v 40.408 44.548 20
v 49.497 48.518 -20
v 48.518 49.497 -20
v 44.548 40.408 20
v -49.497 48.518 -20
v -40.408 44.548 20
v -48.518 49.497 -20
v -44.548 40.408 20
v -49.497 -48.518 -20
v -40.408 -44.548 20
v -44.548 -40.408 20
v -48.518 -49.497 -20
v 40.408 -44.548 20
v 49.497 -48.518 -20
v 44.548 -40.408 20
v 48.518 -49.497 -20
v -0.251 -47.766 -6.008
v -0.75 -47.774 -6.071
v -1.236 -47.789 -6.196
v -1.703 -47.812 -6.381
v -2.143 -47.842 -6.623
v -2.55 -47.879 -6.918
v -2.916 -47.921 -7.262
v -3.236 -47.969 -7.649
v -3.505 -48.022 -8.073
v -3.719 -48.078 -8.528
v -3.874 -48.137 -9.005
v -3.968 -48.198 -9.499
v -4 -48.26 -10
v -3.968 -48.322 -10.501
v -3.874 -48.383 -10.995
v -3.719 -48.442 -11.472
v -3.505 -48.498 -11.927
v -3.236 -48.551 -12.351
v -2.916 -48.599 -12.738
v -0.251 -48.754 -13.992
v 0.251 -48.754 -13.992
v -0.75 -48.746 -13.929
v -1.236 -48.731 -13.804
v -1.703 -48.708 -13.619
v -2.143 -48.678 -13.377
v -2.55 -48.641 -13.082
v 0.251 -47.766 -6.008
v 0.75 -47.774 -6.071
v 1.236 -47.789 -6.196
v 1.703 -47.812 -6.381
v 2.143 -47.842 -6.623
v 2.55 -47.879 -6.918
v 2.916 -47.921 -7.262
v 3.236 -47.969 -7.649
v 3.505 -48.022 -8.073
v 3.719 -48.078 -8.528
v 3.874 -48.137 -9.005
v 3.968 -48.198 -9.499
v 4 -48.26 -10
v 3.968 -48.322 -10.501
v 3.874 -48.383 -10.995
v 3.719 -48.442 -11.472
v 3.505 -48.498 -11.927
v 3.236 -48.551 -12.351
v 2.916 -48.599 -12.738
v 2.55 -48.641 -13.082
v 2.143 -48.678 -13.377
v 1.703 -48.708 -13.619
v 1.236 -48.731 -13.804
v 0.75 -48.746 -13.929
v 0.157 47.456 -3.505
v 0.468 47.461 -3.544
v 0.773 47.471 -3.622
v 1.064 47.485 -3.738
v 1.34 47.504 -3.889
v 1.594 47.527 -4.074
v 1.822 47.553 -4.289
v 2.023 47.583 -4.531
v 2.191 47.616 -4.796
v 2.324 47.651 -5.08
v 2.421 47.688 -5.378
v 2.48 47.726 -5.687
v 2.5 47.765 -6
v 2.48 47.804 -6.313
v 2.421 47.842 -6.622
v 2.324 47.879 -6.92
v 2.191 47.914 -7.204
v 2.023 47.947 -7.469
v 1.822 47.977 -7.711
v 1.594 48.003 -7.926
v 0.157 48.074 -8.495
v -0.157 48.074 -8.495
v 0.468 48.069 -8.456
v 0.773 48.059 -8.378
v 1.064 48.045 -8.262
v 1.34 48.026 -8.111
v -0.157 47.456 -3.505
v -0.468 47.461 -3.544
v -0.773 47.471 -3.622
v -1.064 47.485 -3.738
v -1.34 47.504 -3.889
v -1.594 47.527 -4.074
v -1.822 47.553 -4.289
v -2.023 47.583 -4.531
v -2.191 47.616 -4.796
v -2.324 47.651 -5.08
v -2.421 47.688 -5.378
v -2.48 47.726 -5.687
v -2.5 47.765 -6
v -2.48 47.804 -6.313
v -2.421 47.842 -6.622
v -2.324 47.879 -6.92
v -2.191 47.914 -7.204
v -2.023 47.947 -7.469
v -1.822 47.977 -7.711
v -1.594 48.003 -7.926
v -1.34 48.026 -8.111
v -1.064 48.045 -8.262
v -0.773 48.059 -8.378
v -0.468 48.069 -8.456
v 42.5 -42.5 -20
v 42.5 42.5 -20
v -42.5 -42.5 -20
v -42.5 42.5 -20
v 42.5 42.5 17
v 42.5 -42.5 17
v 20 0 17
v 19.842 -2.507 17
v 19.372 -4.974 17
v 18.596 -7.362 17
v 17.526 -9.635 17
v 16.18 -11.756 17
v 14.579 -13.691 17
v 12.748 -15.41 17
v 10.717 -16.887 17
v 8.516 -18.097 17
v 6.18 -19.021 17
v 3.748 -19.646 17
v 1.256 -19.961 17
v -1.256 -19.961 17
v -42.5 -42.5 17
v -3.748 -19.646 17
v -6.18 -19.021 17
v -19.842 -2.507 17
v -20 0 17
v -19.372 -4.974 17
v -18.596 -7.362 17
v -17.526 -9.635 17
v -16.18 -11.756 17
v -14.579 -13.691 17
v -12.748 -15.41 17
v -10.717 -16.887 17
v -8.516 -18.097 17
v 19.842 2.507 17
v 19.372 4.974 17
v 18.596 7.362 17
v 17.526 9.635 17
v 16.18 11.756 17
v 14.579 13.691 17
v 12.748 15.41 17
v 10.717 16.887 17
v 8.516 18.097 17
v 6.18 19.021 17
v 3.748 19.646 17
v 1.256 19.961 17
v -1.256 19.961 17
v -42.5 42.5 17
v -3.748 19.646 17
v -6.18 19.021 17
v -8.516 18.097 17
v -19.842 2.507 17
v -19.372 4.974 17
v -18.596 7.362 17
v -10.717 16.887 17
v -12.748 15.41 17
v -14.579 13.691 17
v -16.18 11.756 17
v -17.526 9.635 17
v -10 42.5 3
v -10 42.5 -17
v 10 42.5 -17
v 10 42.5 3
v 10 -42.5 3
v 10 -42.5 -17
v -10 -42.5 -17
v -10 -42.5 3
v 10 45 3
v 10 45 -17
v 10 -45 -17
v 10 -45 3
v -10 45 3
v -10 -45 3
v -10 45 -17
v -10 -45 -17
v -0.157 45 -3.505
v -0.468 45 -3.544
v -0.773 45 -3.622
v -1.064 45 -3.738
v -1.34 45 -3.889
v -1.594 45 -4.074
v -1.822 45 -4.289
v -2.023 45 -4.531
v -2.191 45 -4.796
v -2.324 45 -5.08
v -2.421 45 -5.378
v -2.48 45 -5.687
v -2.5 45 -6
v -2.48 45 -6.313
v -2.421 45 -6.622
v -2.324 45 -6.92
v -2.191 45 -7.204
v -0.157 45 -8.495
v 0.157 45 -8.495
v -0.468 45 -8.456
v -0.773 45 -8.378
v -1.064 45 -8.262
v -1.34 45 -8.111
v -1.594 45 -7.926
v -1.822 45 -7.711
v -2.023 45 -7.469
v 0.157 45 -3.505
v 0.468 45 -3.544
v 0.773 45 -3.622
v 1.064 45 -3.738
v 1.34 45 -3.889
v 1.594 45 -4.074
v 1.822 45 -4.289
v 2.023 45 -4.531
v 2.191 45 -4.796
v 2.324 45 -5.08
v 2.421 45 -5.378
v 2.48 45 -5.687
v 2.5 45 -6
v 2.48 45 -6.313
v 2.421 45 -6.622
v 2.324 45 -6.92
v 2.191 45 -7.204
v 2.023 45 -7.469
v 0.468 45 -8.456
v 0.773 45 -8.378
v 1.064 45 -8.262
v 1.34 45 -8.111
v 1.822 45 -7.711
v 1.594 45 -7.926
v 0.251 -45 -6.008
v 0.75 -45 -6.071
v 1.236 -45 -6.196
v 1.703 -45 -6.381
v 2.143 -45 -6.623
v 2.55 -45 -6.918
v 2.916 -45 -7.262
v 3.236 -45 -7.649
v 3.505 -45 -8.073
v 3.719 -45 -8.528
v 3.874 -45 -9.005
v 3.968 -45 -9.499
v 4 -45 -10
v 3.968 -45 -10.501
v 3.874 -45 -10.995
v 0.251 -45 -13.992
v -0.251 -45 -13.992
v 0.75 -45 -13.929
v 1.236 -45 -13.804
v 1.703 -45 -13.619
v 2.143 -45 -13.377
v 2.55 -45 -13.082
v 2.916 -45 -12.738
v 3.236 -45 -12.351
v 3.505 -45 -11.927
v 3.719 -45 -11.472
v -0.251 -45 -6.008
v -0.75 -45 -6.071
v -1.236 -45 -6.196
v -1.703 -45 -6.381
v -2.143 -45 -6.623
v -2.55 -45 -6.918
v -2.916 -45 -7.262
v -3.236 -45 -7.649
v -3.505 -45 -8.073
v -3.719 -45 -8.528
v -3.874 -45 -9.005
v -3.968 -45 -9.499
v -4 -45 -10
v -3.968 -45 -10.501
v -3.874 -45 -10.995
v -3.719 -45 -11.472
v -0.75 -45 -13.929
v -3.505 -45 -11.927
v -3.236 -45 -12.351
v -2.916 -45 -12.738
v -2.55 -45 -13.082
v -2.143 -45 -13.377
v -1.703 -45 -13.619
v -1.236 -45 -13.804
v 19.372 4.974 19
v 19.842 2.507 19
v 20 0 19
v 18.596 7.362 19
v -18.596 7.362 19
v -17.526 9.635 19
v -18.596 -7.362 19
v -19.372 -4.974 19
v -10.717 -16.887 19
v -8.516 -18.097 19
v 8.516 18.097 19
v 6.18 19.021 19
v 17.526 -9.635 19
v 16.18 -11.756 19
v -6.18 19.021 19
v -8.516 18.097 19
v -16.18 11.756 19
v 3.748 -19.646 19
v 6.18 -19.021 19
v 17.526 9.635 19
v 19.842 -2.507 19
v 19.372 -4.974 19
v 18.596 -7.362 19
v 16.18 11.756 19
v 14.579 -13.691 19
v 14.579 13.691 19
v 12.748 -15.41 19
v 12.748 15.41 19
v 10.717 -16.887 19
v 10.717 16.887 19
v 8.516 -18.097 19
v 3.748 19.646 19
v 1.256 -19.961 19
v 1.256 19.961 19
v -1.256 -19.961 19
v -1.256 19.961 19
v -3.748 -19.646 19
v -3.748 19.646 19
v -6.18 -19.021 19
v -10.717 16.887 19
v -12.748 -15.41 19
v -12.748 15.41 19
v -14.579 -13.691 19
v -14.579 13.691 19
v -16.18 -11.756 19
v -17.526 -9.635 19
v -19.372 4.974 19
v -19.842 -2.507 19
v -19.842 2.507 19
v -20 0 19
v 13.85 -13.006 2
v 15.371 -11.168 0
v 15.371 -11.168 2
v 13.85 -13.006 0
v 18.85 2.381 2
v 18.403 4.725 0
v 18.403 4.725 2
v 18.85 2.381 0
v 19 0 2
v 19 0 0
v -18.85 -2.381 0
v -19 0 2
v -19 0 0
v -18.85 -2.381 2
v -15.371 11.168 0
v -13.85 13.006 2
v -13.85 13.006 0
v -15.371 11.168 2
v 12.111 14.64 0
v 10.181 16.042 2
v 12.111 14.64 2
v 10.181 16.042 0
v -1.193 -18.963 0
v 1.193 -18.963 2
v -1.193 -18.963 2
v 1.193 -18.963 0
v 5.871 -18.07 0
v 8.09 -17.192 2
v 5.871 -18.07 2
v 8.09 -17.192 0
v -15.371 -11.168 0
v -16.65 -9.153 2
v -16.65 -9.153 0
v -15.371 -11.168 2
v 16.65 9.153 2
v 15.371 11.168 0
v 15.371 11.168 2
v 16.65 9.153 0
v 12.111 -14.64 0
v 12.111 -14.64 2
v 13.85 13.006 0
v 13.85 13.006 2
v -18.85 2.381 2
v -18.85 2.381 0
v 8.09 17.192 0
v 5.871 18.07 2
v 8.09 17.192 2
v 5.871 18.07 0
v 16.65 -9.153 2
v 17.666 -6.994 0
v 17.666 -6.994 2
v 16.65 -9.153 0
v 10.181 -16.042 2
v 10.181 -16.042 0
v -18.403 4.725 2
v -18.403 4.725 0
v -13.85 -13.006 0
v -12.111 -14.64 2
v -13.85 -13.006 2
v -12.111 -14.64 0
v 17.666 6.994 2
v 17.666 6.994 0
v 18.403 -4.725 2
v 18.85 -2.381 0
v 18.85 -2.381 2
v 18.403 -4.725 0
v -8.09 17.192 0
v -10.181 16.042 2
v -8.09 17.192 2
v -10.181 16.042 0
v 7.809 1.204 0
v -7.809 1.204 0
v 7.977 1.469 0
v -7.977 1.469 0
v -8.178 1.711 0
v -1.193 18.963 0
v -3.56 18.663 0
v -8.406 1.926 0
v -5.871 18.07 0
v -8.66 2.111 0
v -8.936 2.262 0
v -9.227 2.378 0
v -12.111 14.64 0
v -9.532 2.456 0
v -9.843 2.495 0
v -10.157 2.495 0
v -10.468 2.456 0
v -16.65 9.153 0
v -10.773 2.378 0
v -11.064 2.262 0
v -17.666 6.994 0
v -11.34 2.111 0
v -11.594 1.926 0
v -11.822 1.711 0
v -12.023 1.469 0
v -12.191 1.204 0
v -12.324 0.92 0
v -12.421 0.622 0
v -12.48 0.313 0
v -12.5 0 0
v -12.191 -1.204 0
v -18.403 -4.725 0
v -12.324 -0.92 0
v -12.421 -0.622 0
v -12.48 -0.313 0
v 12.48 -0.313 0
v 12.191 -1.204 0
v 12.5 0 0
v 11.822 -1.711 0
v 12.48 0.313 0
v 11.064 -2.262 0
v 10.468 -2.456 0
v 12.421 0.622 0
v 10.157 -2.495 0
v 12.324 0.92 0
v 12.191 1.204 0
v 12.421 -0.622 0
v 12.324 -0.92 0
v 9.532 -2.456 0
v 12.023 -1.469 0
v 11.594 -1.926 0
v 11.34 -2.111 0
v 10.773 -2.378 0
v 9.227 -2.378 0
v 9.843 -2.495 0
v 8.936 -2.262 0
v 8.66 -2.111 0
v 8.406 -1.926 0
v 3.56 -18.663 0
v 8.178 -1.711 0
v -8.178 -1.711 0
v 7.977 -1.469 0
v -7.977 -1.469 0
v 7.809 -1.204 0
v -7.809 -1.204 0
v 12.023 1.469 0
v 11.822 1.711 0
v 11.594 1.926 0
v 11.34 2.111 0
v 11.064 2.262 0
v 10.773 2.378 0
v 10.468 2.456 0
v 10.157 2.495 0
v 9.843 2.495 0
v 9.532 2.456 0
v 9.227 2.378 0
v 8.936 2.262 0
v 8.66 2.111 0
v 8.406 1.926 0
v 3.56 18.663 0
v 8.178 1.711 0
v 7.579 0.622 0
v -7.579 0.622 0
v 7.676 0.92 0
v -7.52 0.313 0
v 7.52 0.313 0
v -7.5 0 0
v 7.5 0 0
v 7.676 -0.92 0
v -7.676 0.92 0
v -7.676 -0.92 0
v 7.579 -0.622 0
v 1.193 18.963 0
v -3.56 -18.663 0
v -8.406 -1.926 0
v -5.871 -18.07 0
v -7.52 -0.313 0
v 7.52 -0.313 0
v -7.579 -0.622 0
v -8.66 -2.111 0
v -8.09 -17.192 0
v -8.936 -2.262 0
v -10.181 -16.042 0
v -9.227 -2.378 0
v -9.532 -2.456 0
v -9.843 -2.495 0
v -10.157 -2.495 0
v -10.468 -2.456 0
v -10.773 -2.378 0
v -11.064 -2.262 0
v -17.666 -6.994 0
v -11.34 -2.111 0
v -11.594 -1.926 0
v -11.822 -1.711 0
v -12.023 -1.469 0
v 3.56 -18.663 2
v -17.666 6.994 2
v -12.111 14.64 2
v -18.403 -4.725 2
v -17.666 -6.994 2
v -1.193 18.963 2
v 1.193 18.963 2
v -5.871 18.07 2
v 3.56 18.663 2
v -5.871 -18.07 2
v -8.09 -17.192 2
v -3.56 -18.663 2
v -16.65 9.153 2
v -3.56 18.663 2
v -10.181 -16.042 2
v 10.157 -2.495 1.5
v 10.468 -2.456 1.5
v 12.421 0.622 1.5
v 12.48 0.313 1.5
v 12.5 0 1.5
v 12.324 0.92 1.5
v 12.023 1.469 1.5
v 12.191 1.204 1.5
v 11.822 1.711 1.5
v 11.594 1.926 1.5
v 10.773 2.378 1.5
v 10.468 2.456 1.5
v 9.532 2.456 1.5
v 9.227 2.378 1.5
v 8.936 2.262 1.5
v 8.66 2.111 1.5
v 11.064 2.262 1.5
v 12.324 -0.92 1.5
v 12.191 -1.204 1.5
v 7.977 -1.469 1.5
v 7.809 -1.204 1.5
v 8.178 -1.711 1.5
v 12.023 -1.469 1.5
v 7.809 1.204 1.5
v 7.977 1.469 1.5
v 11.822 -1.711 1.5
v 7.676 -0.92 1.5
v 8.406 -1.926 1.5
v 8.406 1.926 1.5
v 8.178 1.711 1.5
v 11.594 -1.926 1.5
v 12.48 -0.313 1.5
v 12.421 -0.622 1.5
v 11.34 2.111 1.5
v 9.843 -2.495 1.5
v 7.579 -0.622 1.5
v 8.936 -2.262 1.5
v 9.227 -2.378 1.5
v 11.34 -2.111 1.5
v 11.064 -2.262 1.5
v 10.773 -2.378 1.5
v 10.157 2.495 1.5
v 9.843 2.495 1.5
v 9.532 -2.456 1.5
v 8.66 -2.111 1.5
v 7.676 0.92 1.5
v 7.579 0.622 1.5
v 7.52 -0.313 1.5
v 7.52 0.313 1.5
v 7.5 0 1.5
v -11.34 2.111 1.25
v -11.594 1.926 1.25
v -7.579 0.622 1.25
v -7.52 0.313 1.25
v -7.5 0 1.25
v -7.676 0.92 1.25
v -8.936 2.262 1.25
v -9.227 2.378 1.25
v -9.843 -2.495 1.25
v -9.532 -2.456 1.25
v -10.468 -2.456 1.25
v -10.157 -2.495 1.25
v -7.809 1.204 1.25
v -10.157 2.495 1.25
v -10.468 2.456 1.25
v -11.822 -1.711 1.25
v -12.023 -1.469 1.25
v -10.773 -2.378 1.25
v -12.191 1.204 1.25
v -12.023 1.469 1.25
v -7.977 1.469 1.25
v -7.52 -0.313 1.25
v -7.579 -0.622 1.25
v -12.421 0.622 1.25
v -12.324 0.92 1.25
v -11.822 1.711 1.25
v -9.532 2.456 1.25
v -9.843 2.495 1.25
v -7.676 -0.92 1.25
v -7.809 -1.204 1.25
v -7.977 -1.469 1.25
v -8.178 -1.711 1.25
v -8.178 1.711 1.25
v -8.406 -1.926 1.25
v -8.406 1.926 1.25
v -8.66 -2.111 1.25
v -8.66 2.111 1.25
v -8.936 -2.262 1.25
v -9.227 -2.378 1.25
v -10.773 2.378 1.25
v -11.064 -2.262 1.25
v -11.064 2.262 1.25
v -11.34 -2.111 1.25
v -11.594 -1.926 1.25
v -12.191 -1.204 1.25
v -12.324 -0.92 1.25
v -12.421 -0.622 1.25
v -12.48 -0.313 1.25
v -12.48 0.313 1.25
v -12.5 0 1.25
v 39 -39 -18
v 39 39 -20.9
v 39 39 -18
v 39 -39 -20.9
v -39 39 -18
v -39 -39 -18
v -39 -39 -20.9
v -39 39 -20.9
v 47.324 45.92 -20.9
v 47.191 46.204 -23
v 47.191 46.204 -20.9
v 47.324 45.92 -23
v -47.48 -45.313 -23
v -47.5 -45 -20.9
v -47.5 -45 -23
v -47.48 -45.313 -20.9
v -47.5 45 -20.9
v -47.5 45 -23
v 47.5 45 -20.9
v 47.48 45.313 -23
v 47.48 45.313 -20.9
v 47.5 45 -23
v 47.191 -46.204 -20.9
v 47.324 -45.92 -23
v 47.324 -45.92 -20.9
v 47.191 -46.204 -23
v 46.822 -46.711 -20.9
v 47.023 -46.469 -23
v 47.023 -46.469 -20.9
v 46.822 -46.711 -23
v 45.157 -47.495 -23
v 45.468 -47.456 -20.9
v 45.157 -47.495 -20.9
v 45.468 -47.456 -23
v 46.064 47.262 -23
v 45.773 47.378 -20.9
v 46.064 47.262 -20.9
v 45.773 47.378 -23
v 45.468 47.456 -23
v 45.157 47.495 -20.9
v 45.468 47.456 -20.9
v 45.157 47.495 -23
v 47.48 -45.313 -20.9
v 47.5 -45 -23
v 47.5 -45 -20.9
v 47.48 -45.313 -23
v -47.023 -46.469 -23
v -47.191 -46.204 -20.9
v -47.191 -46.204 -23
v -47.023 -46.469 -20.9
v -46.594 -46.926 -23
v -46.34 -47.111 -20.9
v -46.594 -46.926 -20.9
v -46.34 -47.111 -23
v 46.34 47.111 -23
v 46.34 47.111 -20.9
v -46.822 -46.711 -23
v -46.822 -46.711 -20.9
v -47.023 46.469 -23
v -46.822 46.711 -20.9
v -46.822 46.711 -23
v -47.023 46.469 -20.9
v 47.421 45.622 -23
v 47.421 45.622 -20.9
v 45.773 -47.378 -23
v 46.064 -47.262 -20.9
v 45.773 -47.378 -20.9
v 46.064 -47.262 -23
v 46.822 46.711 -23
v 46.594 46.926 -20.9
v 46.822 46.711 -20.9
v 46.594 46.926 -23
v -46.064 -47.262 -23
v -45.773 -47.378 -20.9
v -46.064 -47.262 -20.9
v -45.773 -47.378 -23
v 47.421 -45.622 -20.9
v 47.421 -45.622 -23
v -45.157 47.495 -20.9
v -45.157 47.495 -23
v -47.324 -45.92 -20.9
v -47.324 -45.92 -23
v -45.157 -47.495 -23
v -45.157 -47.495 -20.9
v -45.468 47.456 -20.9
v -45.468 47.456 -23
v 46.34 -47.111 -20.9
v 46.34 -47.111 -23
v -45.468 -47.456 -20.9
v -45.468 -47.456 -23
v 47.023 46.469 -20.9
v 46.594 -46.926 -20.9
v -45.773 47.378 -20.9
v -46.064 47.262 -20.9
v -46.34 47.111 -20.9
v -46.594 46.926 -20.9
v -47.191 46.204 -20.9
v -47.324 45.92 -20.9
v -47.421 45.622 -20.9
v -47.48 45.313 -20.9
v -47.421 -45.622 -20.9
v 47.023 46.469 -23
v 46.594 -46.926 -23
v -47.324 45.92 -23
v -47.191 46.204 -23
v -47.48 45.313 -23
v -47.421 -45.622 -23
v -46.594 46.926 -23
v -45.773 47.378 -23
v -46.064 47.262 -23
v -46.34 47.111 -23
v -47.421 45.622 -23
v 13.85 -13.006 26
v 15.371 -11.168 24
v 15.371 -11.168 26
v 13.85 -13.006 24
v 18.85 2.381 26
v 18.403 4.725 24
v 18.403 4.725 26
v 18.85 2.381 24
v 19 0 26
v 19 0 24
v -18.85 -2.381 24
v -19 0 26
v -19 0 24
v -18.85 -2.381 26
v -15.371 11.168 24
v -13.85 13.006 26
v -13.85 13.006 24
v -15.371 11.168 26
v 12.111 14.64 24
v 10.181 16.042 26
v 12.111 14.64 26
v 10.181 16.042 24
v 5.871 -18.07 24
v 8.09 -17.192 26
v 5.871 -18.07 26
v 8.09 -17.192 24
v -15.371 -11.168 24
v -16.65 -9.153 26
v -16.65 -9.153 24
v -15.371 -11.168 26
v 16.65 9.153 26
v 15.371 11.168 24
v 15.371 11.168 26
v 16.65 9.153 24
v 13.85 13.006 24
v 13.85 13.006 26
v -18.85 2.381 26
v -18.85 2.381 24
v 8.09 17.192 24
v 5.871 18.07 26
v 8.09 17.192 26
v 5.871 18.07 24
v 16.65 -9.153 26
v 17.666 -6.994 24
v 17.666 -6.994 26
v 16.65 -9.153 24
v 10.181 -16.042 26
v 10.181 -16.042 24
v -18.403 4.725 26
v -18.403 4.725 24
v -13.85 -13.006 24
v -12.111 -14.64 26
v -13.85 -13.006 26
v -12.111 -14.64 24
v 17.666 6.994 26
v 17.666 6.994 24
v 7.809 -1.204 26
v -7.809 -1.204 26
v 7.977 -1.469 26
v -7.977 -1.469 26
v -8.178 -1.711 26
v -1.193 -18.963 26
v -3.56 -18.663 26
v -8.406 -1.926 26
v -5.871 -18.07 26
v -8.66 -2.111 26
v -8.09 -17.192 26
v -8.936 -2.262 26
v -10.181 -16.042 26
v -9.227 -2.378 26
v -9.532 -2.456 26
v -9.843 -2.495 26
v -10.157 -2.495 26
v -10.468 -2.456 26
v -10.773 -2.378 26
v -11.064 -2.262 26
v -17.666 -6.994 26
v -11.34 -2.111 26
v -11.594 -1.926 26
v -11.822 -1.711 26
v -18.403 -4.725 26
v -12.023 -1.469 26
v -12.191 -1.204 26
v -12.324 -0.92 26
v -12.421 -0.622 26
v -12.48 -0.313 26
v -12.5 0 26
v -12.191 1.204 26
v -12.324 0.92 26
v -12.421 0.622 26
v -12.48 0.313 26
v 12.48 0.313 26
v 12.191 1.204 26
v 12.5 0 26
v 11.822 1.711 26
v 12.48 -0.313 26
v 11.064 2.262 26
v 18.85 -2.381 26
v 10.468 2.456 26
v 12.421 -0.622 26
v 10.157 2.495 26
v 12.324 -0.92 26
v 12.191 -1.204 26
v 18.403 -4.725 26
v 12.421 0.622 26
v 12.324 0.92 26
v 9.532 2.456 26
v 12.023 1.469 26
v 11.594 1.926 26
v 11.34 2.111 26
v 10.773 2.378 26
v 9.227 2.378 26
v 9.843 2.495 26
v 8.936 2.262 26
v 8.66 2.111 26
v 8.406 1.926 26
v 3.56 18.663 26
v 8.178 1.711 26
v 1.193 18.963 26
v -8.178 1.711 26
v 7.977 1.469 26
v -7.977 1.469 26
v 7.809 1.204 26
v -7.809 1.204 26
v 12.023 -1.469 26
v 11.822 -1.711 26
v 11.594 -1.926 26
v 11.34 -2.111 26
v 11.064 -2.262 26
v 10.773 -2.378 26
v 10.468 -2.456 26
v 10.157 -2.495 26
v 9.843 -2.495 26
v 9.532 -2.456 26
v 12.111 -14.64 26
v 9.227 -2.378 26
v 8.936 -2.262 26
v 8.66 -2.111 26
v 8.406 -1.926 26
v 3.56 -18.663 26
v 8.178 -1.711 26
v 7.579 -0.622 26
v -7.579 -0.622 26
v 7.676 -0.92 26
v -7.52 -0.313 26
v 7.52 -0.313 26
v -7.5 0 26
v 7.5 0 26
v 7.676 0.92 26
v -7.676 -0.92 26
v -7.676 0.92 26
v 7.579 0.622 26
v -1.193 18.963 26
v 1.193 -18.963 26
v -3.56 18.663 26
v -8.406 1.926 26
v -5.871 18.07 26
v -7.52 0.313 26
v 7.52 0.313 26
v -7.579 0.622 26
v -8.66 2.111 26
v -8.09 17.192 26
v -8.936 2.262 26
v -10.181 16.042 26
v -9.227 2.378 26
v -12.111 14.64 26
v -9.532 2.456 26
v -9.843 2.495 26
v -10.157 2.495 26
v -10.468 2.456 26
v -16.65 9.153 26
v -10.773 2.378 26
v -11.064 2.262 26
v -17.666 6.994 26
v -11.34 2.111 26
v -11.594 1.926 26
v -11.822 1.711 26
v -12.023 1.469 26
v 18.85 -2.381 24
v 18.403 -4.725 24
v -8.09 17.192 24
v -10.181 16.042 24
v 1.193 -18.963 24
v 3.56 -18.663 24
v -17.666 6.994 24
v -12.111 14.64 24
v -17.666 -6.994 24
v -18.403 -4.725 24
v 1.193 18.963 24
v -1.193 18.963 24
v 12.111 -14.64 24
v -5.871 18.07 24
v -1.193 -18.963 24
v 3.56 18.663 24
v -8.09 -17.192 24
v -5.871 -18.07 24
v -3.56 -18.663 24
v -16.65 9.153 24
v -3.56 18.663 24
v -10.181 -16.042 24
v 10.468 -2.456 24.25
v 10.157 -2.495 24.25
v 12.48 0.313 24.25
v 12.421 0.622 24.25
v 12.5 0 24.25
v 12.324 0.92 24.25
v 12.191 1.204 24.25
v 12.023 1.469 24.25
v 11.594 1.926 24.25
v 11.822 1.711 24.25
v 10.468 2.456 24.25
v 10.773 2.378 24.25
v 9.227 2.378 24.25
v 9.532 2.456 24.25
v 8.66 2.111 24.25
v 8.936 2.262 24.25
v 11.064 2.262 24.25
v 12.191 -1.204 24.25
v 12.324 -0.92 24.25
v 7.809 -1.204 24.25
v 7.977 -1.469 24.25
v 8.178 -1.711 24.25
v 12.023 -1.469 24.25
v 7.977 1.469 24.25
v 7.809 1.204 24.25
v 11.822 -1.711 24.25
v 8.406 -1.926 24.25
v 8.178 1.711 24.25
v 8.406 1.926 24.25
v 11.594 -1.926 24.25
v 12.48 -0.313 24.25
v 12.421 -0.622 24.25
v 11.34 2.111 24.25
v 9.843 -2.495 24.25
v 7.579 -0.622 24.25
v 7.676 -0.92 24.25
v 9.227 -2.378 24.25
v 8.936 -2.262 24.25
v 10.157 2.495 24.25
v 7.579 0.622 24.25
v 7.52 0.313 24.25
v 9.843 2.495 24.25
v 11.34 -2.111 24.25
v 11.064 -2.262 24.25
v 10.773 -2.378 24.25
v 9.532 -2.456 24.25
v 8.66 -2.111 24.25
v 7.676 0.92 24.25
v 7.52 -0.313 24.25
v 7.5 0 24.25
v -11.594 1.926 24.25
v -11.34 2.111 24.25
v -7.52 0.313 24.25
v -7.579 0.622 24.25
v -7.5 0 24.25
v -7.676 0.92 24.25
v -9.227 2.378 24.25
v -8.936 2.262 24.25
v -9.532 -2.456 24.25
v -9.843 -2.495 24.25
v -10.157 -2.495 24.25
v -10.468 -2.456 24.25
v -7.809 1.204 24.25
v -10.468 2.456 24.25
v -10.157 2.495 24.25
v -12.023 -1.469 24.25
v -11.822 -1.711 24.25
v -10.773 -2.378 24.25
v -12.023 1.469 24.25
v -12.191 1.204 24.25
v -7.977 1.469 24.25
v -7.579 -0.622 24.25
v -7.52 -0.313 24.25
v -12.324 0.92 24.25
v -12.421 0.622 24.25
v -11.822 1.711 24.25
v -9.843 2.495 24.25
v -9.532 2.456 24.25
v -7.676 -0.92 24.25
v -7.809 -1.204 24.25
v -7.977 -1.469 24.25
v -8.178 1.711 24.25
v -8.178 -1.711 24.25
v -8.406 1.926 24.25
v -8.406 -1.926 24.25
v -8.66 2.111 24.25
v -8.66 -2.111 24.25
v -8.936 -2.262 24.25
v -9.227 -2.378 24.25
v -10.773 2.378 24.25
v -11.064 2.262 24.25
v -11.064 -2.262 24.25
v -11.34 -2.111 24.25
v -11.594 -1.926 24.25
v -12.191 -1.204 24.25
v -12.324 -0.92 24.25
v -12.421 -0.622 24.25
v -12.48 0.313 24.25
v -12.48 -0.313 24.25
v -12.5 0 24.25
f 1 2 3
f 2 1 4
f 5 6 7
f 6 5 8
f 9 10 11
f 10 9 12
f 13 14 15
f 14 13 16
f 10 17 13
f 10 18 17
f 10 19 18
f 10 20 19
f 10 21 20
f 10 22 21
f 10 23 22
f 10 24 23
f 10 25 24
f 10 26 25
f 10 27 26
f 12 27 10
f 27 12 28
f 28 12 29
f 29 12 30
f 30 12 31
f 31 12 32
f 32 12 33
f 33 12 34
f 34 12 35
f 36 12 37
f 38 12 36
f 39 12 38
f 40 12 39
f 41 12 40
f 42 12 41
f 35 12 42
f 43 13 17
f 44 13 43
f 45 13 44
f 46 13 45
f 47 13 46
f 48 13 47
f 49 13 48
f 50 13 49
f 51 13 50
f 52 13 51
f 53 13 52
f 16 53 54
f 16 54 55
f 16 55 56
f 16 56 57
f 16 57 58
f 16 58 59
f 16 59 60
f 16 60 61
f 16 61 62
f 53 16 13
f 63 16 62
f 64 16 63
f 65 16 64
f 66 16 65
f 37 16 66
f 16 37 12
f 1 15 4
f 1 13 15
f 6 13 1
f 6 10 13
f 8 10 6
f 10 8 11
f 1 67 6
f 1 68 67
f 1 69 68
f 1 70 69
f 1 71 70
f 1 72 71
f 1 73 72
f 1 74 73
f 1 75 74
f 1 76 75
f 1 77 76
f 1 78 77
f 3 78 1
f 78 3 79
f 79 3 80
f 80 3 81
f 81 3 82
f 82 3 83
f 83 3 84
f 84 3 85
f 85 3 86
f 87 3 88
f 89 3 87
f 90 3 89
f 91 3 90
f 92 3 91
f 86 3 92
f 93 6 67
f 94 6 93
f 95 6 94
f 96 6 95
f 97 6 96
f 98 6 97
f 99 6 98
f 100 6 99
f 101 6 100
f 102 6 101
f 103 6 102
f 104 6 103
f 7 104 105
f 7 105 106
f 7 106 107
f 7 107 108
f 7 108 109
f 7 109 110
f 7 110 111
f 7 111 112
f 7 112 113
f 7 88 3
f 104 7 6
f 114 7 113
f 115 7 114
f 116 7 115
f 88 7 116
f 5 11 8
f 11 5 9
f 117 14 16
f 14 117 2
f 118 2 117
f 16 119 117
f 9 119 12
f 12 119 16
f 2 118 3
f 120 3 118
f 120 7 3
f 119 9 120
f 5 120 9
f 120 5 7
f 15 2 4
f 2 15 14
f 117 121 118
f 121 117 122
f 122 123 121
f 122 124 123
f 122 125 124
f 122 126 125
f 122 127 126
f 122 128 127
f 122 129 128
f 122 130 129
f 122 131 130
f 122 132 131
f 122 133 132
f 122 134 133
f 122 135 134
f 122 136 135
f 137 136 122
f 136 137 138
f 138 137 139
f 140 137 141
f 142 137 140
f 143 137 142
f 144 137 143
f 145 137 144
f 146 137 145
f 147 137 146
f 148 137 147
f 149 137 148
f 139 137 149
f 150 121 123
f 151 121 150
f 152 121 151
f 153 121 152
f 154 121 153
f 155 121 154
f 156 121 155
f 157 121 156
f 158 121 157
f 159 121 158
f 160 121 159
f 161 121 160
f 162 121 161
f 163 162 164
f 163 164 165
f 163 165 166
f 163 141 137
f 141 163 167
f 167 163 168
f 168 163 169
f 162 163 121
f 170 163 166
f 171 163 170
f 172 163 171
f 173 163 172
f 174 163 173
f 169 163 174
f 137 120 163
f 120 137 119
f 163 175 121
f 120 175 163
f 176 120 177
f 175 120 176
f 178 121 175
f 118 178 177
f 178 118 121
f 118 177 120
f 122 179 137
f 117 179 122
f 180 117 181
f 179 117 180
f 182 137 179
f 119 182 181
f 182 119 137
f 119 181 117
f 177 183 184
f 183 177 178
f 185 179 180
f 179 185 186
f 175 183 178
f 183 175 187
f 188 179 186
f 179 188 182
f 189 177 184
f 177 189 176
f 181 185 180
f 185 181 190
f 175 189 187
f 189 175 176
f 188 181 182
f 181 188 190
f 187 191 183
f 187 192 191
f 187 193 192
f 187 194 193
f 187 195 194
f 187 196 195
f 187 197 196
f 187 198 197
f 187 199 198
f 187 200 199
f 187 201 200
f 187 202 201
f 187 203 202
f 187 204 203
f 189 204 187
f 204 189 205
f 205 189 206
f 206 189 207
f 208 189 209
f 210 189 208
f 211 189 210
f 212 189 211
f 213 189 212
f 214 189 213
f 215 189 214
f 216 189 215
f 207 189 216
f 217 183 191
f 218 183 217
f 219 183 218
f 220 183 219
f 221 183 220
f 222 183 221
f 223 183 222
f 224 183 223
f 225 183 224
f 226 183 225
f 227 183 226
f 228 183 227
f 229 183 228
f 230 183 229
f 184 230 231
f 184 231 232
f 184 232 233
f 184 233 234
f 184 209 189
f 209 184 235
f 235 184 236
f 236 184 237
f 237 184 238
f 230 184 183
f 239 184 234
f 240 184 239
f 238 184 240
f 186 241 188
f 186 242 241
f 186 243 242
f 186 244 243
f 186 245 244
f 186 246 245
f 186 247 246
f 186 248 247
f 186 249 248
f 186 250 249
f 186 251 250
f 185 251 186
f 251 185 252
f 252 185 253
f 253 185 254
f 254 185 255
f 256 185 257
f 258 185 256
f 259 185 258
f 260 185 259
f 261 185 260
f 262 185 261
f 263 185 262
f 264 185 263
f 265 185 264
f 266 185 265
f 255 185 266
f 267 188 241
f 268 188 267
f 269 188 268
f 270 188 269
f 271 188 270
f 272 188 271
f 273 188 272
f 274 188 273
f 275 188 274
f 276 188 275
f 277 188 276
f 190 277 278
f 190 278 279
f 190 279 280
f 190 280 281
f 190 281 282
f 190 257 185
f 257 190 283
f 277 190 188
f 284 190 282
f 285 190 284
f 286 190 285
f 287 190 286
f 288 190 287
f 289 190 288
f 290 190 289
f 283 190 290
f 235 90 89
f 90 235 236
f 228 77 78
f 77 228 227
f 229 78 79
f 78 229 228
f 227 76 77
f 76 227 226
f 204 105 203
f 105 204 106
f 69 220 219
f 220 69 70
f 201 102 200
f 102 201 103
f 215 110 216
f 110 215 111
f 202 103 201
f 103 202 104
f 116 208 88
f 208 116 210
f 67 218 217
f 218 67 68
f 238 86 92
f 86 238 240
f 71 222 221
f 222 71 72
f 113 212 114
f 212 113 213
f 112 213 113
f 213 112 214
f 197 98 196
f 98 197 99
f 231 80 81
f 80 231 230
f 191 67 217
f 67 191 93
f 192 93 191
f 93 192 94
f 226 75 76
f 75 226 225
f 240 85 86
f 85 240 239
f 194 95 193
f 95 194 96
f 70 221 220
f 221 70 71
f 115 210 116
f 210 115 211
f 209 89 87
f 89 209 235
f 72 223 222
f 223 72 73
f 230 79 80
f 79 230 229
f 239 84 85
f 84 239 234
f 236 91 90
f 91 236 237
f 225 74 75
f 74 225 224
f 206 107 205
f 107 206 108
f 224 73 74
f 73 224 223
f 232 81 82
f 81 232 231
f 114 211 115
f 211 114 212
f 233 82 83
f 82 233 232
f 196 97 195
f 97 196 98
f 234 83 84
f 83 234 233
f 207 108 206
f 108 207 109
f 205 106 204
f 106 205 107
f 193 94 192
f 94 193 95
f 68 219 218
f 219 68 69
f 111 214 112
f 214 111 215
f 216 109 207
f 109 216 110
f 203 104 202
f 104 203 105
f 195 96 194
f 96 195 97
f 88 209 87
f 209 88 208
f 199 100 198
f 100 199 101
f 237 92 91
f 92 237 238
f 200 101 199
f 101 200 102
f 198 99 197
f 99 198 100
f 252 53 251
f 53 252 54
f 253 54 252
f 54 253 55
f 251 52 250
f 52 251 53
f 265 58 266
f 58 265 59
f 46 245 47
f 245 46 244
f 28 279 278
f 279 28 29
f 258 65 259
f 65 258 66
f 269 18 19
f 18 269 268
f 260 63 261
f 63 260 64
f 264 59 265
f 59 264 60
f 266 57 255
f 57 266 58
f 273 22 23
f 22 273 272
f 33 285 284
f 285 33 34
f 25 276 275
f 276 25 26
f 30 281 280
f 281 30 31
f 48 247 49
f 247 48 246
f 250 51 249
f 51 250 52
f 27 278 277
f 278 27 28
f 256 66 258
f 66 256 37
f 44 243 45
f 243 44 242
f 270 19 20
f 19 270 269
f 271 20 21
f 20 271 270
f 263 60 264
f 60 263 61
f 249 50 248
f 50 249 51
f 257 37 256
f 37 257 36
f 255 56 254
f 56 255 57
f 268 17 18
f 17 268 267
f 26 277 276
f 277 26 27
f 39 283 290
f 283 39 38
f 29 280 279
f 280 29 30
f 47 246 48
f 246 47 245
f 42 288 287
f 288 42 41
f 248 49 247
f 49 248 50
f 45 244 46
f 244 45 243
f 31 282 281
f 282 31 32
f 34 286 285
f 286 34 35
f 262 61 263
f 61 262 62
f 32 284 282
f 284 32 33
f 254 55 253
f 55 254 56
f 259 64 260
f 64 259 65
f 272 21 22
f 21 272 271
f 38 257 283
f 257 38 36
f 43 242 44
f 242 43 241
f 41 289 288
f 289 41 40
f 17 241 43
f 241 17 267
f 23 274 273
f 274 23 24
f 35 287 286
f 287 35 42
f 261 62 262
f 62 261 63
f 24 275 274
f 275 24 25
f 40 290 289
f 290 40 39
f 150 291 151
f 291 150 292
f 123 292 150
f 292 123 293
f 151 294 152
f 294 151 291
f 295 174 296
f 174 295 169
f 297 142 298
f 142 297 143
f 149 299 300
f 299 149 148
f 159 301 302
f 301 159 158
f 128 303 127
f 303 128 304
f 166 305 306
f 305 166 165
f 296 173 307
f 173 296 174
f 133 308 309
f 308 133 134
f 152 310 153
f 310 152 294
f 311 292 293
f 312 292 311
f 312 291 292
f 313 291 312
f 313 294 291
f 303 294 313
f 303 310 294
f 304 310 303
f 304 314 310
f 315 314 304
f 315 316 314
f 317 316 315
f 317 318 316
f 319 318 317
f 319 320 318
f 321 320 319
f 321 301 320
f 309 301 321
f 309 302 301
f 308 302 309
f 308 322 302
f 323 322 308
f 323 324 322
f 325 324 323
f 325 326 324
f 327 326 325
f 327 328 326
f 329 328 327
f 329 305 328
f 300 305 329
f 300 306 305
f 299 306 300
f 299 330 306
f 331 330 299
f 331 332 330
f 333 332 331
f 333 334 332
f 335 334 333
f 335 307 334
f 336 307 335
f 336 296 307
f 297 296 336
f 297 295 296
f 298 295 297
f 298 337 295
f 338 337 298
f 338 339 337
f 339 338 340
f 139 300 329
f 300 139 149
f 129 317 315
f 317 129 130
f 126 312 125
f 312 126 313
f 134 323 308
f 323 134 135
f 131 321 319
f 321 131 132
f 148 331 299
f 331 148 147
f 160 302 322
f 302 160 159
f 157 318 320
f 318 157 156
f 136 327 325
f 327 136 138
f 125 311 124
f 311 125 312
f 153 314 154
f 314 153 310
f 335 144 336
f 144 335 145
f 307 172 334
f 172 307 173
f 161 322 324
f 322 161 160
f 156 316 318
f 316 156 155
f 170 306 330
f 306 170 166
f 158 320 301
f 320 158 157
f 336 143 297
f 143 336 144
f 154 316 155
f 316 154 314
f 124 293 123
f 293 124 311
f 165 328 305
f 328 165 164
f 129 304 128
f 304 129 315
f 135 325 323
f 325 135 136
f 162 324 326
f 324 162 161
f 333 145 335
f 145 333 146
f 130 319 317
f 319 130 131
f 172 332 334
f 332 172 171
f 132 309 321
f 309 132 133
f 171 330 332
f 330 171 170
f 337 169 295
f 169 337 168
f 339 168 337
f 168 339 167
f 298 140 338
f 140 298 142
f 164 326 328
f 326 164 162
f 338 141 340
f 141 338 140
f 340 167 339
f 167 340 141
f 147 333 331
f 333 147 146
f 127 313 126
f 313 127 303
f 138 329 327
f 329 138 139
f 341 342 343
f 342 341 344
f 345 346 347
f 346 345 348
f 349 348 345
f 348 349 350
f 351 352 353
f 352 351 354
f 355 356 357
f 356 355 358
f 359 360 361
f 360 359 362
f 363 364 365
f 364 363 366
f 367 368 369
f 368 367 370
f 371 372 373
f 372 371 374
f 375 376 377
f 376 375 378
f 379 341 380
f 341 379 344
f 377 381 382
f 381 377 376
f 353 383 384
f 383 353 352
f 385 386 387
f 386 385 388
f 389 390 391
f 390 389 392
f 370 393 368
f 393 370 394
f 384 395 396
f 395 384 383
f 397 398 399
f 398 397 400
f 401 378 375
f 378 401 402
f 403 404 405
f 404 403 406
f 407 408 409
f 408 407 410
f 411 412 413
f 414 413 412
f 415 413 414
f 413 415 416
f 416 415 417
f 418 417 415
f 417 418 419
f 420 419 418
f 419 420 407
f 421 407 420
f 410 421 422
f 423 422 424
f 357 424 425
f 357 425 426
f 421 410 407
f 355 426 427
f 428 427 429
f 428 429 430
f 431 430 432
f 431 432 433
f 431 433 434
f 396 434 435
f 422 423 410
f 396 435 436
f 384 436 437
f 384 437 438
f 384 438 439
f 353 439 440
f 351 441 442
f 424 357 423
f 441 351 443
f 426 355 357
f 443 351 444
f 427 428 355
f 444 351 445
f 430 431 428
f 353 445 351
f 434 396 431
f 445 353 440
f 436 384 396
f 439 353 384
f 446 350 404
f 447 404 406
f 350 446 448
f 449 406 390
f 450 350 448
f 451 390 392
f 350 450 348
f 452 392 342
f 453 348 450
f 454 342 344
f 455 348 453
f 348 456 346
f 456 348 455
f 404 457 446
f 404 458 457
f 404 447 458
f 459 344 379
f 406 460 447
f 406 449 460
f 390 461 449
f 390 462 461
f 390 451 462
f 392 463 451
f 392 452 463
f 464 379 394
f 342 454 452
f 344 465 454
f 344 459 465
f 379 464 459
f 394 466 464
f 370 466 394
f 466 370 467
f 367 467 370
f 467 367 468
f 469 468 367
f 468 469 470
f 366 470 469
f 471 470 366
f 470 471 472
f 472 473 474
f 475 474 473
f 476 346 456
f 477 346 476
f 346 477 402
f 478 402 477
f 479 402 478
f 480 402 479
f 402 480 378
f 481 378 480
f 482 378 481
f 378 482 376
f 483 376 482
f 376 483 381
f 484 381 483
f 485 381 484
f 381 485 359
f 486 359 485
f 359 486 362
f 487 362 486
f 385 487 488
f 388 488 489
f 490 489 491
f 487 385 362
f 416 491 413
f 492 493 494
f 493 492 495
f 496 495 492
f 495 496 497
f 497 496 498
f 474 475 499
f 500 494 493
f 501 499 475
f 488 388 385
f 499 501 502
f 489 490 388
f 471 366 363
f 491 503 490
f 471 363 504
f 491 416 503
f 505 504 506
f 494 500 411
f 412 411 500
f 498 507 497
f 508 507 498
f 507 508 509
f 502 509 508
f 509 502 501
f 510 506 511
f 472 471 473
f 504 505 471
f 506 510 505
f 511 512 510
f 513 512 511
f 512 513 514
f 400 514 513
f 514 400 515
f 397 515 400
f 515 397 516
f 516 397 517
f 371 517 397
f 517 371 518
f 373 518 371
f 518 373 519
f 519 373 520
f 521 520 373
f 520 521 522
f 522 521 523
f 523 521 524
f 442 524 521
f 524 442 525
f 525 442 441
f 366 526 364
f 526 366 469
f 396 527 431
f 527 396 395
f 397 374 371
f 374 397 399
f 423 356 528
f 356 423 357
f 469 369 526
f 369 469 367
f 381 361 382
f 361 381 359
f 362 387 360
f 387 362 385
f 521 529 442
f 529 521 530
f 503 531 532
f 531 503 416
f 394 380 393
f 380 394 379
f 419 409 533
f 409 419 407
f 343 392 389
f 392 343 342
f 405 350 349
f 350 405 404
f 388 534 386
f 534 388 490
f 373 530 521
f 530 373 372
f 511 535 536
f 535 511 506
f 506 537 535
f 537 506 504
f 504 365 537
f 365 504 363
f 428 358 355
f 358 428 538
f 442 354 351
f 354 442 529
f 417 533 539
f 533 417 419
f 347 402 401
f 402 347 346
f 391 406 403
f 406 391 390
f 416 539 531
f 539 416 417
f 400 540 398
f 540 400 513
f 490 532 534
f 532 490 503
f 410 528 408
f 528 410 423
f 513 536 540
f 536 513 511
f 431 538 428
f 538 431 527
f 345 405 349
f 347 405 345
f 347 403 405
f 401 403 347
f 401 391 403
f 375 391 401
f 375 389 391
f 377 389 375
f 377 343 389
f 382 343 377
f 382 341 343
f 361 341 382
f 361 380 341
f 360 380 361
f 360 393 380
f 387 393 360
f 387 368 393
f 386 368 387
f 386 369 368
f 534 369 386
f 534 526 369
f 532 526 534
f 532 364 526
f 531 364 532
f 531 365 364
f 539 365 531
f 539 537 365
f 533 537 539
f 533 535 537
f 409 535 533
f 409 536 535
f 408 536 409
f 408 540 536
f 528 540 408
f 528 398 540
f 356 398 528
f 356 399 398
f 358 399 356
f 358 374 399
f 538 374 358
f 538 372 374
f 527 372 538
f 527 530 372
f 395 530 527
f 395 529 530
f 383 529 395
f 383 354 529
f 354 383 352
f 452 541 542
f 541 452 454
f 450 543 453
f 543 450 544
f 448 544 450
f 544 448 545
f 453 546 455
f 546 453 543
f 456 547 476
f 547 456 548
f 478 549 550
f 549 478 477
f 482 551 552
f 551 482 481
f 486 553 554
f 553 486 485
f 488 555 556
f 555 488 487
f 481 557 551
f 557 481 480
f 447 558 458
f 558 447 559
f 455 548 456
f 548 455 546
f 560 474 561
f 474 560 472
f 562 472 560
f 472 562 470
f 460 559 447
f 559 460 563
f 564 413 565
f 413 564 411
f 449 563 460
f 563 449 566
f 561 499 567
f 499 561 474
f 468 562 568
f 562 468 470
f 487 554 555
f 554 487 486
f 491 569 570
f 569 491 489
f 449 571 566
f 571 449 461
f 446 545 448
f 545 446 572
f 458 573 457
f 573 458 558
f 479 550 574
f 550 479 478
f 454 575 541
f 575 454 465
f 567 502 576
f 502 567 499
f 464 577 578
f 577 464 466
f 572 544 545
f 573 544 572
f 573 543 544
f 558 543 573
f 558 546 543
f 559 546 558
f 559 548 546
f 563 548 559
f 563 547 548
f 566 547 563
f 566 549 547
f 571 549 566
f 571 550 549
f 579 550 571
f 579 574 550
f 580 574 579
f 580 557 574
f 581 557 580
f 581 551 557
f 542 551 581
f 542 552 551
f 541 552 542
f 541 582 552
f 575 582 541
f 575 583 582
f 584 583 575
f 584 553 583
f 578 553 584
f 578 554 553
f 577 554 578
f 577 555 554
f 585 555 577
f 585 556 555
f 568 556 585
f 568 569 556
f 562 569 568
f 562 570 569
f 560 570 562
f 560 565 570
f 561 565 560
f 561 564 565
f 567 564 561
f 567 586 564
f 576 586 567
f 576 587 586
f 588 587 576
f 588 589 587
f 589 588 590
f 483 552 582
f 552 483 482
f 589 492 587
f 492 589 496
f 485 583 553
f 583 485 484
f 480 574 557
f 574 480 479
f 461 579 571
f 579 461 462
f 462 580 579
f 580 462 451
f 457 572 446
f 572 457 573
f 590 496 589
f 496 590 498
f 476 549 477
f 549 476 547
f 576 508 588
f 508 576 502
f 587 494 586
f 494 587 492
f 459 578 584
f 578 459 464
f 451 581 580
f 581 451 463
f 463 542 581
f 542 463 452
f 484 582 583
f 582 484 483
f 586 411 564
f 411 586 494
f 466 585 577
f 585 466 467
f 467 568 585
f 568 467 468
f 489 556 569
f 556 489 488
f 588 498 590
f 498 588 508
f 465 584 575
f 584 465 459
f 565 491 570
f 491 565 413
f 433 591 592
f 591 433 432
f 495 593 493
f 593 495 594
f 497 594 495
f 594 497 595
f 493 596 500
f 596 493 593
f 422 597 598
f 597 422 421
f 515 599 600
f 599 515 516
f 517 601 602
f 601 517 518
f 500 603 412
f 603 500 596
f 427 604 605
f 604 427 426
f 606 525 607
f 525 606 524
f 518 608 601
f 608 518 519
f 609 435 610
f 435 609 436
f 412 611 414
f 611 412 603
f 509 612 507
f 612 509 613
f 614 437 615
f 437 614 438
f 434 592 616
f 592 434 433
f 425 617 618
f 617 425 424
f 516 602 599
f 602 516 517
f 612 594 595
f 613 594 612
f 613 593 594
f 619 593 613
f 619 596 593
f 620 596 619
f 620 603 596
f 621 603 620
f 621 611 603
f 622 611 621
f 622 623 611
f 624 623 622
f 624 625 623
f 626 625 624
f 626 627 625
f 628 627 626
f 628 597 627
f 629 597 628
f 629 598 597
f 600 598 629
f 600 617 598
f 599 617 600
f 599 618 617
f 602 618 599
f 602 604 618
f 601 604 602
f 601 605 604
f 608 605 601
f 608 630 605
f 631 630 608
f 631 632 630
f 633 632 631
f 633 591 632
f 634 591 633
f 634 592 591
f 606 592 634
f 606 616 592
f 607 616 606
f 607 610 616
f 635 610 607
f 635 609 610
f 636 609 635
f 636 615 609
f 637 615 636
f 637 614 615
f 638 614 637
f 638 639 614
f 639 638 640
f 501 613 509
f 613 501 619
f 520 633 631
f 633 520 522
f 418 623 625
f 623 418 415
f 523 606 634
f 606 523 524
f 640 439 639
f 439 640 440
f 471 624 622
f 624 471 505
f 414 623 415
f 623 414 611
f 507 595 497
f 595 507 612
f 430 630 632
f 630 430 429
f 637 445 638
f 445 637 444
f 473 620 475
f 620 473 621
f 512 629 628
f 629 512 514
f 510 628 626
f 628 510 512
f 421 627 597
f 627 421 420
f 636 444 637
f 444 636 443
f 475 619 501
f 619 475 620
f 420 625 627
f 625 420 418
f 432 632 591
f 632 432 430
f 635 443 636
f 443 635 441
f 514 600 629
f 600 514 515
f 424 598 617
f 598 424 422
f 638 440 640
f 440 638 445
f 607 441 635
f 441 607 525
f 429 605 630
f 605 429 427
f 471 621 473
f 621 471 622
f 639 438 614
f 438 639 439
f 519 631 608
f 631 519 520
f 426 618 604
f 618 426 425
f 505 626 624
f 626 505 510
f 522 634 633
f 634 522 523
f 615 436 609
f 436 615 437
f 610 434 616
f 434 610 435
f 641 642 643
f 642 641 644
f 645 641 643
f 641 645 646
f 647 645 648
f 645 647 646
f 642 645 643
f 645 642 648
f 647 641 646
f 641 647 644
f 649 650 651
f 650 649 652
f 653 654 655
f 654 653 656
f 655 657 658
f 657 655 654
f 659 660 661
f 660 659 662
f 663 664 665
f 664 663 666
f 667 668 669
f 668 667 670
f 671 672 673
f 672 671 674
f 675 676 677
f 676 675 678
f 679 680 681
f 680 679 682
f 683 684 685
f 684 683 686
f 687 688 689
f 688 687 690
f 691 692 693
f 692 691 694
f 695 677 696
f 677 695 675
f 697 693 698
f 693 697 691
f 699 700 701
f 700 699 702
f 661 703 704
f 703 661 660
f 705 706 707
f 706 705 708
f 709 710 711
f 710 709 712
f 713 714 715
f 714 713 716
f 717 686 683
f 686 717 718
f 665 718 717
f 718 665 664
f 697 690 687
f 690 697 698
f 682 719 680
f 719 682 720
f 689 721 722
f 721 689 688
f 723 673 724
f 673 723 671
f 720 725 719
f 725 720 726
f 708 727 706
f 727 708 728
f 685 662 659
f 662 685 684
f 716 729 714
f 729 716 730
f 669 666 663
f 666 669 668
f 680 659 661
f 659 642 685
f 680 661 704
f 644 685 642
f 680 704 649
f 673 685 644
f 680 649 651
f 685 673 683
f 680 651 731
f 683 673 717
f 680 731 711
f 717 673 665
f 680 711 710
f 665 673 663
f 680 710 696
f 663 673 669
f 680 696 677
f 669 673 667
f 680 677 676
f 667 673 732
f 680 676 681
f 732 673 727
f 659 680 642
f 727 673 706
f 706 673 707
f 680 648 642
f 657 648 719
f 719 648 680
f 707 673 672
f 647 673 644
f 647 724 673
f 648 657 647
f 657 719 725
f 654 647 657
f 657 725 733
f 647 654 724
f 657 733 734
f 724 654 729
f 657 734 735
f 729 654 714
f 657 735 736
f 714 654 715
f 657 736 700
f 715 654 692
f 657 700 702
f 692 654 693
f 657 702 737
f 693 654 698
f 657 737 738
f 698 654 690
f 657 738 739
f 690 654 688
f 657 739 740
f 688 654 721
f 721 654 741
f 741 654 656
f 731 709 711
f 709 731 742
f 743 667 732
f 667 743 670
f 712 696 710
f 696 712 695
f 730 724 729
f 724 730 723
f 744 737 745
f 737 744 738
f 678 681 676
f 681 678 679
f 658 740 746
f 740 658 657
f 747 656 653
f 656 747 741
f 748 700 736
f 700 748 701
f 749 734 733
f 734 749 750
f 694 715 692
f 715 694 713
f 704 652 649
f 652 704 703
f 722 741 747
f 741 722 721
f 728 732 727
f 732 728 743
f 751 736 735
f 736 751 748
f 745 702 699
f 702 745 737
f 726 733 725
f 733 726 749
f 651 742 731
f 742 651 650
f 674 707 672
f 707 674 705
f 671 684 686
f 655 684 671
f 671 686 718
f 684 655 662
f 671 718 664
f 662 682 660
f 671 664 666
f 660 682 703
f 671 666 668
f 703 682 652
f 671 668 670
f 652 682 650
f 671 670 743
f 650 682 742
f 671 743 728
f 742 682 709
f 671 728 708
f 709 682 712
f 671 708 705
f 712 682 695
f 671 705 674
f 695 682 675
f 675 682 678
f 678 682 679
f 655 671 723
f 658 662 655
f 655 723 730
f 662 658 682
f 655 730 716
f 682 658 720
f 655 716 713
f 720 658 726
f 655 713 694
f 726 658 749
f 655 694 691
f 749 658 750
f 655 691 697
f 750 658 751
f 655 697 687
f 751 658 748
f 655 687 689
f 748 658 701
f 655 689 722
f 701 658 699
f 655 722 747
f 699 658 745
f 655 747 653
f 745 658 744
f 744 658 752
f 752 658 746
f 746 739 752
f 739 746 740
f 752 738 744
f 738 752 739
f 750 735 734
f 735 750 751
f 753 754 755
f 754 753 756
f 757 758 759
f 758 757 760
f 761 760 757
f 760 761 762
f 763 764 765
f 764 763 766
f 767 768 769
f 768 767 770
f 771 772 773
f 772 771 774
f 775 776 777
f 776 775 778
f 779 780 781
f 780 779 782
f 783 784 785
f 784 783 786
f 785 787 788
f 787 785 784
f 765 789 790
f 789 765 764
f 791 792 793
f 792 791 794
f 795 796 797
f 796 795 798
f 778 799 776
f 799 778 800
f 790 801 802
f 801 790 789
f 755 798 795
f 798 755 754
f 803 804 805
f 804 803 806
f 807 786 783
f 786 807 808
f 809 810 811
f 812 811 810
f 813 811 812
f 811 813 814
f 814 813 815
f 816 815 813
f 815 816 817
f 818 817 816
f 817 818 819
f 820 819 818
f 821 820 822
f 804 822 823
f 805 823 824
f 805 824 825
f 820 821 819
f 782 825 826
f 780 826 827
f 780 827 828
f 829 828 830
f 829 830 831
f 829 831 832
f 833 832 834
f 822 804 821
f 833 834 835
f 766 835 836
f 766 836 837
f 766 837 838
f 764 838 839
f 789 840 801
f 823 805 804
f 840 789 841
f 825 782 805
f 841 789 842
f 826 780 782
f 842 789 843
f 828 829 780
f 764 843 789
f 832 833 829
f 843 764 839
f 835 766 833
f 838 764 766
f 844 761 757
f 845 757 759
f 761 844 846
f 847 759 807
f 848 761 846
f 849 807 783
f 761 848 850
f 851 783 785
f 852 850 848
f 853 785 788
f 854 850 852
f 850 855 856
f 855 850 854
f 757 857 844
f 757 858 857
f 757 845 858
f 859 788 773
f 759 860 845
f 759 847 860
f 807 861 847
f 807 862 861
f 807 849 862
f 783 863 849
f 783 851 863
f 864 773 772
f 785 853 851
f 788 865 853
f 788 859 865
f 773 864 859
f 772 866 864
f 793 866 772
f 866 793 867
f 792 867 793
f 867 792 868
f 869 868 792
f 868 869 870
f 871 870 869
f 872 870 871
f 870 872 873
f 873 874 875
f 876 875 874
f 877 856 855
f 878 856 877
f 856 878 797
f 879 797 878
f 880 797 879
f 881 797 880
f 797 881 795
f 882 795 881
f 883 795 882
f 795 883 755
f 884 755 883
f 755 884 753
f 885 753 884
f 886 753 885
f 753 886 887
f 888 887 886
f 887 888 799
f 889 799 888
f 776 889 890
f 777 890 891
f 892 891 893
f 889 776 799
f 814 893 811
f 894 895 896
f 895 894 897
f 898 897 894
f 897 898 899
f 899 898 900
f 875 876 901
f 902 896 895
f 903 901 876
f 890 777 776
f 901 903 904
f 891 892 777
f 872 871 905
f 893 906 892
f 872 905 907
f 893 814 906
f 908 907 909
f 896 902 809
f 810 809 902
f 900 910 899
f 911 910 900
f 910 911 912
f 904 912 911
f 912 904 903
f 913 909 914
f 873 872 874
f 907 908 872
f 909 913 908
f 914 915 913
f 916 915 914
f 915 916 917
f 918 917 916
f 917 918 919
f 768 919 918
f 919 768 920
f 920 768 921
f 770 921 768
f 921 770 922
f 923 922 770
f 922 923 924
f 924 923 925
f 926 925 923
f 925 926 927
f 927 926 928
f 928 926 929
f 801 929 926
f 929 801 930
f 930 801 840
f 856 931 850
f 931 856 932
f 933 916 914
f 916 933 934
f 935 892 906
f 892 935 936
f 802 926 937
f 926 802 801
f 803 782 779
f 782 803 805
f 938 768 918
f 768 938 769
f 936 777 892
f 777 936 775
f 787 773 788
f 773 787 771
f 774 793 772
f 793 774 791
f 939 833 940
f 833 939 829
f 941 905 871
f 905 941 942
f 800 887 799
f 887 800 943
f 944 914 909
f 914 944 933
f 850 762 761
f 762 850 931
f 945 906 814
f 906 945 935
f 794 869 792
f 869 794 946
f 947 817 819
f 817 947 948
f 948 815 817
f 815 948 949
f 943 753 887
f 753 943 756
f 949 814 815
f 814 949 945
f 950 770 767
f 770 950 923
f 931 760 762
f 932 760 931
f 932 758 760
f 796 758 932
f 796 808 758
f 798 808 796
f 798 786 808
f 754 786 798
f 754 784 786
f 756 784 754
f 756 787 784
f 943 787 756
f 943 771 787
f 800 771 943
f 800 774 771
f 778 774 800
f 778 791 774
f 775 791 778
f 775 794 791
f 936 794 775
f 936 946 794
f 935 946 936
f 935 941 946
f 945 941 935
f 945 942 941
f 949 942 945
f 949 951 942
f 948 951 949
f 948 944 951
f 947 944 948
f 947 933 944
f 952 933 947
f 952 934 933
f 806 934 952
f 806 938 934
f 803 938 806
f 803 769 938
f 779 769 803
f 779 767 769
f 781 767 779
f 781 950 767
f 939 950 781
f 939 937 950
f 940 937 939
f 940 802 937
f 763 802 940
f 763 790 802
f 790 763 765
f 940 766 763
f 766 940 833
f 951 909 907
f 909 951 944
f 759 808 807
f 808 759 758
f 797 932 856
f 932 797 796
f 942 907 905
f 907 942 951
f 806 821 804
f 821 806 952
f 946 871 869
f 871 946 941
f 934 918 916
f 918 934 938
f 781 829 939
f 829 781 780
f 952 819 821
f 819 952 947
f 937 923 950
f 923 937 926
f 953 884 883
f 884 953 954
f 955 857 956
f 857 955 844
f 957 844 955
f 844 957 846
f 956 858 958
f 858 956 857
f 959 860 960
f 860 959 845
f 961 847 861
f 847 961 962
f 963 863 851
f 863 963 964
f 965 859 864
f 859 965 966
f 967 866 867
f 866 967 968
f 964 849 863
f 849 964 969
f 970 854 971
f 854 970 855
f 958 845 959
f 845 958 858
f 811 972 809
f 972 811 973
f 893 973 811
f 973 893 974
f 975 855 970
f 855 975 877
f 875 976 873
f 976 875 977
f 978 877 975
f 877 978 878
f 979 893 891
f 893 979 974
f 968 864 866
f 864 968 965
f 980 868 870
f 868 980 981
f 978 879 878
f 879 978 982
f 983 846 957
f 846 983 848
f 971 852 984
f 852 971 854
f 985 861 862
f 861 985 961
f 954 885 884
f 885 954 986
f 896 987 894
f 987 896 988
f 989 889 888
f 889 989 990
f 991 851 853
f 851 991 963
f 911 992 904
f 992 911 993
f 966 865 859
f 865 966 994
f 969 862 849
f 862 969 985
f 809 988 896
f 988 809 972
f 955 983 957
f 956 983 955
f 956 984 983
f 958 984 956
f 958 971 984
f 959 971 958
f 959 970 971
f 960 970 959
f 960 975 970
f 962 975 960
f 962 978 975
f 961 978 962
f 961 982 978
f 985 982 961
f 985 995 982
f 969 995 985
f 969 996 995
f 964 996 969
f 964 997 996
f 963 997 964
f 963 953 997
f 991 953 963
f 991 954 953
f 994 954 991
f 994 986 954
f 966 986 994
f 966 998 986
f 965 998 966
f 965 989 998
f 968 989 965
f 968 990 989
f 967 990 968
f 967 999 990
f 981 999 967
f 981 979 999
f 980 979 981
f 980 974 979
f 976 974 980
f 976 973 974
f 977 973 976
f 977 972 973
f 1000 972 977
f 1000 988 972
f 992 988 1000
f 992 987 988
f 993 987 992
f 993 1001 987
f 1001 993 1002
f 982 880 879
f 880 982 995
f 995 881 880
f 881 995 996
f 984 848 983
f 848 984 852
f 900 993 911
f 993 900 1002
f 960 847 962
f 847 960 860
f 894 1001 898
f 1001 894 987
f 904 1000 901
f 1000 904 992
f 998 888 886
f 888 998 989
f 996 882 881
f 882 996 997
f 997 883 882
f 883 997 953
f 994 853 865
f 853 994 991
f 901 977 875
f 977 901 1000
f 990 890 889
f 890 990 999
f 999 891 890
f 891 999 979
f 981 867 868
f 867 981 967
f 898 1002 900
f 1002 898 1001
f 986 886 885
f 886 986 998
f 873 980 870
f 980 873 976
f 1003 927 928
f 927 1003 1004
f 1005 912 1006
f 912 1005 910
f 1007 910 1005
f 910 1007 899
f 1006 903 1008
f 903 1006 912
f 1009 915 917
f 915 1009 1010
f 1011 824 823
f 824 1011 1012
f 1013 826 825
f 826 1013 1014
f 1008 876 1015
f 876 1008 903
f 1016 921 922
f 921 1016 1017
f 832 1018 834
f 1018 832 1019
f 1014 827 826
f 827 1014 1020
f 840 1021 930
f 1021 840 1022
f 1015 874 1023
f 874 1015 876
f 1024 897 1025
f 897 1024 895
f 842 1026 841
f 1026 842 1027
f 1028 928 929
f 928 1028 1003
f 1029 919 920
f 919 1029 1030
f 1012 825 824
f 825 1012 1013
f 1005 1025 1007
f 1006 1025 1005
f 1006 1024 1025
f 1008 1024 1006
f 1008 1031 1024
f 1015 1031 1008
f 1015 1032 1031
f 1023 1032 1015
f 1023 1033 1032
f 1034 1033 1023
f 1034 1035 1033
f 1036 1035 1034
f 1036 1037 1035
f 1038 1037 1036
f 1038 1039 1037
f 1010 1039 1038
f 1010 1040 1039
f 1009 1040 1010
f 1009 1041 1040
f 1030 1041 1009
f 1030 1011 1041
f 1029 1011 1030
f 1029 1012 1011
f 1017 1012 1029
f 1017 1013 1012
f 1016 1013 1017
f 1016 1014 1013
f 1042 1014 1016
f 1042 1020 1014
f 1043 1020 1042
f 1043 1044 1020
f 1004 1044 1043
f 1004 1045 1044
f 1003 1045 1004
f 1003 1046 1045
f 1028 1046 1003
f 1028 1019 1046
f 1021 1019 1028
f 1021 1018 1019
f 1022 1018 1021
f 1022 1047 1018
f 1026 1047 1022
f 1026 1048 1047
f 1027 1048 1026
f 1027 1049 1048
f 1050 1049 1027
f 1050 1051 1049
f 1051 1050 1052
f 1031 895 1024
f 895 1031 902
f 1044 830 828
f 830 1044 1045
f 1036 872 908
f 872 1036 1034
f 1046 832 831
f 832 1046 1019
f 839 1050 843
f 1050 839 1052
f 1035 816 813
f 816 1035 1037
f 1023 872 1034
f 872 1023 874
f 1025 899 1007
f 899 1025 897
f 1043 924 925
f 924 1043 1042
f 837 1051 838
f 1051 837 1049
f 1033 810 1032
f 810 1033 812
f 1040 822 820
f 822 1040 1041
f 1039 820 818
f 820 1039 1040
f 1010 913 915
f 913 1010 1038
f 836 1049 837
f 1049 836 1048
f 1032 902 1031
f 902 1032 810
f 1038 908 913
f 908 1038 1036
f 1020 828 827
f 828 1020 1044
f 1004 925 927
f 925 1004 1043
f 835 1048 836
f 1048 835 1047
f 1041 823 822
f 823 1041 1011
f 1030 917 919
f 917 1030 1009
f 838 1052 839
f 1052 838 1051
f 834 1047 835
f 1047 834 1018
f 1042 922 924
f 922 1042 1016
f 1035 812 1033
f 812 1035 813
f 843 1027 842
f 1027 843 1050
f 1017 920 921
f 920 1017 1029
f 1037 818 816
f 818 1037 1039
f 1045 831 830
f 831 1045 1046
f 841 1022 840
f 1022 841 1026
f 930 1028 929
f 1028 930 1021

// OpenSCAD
  $fn=50;
 difference() {
    translate([0,0,-20]) rotate([0,0,45]) cylinder(d2=90*1.4,d=100*1.4,h=40,$fn=4);
     
// cooler
    translate([0,0,-3]) cube([85,85,40],center=true);
// espacio
    translate([0,0,-7]) cube([20,90,20],center=true);
     
     // perforaciones
    translate([0,40,-6]) rotate([90,0,0]) cylinder(d=5,h=20,center=true);
    translate([0,-40,-10]) rotate([90,0,0]) cylinder(d=8,h=20,center=true);


   for (i = [0:90:360])
    rotate([0,0,i])
        translate([53,53,0])
        rotate([0,-13,45])
        cube([20,20,60],center=true);

    translate([0,0,17])
    cylinder(d=40,h=2); 
}  


difference() {
    cylinder(d=38,h=2);
    translate([10,0,-.25])
    cylinder(d=5,h=1.75);
    translate([-10,0,-.25])
    cylinder(d=5,h=1.5);
}


 translate([0,0,-20]) { 
     cube([78,78,4],center=true);
     translate([0,0,-2])  minkowski() {
     cube([90,90,2],center=true);
         cylinder(d=5,h=.1);
     }
 }

translate([0,0,24])
 
difference() {
    cylinder(d=38,h=2);
    translate([10,0,.25])
    cylinder(d=5,h=1.75);
    translate([-10,0,.25])
    cylinder(d=5,h=1.75);
}
